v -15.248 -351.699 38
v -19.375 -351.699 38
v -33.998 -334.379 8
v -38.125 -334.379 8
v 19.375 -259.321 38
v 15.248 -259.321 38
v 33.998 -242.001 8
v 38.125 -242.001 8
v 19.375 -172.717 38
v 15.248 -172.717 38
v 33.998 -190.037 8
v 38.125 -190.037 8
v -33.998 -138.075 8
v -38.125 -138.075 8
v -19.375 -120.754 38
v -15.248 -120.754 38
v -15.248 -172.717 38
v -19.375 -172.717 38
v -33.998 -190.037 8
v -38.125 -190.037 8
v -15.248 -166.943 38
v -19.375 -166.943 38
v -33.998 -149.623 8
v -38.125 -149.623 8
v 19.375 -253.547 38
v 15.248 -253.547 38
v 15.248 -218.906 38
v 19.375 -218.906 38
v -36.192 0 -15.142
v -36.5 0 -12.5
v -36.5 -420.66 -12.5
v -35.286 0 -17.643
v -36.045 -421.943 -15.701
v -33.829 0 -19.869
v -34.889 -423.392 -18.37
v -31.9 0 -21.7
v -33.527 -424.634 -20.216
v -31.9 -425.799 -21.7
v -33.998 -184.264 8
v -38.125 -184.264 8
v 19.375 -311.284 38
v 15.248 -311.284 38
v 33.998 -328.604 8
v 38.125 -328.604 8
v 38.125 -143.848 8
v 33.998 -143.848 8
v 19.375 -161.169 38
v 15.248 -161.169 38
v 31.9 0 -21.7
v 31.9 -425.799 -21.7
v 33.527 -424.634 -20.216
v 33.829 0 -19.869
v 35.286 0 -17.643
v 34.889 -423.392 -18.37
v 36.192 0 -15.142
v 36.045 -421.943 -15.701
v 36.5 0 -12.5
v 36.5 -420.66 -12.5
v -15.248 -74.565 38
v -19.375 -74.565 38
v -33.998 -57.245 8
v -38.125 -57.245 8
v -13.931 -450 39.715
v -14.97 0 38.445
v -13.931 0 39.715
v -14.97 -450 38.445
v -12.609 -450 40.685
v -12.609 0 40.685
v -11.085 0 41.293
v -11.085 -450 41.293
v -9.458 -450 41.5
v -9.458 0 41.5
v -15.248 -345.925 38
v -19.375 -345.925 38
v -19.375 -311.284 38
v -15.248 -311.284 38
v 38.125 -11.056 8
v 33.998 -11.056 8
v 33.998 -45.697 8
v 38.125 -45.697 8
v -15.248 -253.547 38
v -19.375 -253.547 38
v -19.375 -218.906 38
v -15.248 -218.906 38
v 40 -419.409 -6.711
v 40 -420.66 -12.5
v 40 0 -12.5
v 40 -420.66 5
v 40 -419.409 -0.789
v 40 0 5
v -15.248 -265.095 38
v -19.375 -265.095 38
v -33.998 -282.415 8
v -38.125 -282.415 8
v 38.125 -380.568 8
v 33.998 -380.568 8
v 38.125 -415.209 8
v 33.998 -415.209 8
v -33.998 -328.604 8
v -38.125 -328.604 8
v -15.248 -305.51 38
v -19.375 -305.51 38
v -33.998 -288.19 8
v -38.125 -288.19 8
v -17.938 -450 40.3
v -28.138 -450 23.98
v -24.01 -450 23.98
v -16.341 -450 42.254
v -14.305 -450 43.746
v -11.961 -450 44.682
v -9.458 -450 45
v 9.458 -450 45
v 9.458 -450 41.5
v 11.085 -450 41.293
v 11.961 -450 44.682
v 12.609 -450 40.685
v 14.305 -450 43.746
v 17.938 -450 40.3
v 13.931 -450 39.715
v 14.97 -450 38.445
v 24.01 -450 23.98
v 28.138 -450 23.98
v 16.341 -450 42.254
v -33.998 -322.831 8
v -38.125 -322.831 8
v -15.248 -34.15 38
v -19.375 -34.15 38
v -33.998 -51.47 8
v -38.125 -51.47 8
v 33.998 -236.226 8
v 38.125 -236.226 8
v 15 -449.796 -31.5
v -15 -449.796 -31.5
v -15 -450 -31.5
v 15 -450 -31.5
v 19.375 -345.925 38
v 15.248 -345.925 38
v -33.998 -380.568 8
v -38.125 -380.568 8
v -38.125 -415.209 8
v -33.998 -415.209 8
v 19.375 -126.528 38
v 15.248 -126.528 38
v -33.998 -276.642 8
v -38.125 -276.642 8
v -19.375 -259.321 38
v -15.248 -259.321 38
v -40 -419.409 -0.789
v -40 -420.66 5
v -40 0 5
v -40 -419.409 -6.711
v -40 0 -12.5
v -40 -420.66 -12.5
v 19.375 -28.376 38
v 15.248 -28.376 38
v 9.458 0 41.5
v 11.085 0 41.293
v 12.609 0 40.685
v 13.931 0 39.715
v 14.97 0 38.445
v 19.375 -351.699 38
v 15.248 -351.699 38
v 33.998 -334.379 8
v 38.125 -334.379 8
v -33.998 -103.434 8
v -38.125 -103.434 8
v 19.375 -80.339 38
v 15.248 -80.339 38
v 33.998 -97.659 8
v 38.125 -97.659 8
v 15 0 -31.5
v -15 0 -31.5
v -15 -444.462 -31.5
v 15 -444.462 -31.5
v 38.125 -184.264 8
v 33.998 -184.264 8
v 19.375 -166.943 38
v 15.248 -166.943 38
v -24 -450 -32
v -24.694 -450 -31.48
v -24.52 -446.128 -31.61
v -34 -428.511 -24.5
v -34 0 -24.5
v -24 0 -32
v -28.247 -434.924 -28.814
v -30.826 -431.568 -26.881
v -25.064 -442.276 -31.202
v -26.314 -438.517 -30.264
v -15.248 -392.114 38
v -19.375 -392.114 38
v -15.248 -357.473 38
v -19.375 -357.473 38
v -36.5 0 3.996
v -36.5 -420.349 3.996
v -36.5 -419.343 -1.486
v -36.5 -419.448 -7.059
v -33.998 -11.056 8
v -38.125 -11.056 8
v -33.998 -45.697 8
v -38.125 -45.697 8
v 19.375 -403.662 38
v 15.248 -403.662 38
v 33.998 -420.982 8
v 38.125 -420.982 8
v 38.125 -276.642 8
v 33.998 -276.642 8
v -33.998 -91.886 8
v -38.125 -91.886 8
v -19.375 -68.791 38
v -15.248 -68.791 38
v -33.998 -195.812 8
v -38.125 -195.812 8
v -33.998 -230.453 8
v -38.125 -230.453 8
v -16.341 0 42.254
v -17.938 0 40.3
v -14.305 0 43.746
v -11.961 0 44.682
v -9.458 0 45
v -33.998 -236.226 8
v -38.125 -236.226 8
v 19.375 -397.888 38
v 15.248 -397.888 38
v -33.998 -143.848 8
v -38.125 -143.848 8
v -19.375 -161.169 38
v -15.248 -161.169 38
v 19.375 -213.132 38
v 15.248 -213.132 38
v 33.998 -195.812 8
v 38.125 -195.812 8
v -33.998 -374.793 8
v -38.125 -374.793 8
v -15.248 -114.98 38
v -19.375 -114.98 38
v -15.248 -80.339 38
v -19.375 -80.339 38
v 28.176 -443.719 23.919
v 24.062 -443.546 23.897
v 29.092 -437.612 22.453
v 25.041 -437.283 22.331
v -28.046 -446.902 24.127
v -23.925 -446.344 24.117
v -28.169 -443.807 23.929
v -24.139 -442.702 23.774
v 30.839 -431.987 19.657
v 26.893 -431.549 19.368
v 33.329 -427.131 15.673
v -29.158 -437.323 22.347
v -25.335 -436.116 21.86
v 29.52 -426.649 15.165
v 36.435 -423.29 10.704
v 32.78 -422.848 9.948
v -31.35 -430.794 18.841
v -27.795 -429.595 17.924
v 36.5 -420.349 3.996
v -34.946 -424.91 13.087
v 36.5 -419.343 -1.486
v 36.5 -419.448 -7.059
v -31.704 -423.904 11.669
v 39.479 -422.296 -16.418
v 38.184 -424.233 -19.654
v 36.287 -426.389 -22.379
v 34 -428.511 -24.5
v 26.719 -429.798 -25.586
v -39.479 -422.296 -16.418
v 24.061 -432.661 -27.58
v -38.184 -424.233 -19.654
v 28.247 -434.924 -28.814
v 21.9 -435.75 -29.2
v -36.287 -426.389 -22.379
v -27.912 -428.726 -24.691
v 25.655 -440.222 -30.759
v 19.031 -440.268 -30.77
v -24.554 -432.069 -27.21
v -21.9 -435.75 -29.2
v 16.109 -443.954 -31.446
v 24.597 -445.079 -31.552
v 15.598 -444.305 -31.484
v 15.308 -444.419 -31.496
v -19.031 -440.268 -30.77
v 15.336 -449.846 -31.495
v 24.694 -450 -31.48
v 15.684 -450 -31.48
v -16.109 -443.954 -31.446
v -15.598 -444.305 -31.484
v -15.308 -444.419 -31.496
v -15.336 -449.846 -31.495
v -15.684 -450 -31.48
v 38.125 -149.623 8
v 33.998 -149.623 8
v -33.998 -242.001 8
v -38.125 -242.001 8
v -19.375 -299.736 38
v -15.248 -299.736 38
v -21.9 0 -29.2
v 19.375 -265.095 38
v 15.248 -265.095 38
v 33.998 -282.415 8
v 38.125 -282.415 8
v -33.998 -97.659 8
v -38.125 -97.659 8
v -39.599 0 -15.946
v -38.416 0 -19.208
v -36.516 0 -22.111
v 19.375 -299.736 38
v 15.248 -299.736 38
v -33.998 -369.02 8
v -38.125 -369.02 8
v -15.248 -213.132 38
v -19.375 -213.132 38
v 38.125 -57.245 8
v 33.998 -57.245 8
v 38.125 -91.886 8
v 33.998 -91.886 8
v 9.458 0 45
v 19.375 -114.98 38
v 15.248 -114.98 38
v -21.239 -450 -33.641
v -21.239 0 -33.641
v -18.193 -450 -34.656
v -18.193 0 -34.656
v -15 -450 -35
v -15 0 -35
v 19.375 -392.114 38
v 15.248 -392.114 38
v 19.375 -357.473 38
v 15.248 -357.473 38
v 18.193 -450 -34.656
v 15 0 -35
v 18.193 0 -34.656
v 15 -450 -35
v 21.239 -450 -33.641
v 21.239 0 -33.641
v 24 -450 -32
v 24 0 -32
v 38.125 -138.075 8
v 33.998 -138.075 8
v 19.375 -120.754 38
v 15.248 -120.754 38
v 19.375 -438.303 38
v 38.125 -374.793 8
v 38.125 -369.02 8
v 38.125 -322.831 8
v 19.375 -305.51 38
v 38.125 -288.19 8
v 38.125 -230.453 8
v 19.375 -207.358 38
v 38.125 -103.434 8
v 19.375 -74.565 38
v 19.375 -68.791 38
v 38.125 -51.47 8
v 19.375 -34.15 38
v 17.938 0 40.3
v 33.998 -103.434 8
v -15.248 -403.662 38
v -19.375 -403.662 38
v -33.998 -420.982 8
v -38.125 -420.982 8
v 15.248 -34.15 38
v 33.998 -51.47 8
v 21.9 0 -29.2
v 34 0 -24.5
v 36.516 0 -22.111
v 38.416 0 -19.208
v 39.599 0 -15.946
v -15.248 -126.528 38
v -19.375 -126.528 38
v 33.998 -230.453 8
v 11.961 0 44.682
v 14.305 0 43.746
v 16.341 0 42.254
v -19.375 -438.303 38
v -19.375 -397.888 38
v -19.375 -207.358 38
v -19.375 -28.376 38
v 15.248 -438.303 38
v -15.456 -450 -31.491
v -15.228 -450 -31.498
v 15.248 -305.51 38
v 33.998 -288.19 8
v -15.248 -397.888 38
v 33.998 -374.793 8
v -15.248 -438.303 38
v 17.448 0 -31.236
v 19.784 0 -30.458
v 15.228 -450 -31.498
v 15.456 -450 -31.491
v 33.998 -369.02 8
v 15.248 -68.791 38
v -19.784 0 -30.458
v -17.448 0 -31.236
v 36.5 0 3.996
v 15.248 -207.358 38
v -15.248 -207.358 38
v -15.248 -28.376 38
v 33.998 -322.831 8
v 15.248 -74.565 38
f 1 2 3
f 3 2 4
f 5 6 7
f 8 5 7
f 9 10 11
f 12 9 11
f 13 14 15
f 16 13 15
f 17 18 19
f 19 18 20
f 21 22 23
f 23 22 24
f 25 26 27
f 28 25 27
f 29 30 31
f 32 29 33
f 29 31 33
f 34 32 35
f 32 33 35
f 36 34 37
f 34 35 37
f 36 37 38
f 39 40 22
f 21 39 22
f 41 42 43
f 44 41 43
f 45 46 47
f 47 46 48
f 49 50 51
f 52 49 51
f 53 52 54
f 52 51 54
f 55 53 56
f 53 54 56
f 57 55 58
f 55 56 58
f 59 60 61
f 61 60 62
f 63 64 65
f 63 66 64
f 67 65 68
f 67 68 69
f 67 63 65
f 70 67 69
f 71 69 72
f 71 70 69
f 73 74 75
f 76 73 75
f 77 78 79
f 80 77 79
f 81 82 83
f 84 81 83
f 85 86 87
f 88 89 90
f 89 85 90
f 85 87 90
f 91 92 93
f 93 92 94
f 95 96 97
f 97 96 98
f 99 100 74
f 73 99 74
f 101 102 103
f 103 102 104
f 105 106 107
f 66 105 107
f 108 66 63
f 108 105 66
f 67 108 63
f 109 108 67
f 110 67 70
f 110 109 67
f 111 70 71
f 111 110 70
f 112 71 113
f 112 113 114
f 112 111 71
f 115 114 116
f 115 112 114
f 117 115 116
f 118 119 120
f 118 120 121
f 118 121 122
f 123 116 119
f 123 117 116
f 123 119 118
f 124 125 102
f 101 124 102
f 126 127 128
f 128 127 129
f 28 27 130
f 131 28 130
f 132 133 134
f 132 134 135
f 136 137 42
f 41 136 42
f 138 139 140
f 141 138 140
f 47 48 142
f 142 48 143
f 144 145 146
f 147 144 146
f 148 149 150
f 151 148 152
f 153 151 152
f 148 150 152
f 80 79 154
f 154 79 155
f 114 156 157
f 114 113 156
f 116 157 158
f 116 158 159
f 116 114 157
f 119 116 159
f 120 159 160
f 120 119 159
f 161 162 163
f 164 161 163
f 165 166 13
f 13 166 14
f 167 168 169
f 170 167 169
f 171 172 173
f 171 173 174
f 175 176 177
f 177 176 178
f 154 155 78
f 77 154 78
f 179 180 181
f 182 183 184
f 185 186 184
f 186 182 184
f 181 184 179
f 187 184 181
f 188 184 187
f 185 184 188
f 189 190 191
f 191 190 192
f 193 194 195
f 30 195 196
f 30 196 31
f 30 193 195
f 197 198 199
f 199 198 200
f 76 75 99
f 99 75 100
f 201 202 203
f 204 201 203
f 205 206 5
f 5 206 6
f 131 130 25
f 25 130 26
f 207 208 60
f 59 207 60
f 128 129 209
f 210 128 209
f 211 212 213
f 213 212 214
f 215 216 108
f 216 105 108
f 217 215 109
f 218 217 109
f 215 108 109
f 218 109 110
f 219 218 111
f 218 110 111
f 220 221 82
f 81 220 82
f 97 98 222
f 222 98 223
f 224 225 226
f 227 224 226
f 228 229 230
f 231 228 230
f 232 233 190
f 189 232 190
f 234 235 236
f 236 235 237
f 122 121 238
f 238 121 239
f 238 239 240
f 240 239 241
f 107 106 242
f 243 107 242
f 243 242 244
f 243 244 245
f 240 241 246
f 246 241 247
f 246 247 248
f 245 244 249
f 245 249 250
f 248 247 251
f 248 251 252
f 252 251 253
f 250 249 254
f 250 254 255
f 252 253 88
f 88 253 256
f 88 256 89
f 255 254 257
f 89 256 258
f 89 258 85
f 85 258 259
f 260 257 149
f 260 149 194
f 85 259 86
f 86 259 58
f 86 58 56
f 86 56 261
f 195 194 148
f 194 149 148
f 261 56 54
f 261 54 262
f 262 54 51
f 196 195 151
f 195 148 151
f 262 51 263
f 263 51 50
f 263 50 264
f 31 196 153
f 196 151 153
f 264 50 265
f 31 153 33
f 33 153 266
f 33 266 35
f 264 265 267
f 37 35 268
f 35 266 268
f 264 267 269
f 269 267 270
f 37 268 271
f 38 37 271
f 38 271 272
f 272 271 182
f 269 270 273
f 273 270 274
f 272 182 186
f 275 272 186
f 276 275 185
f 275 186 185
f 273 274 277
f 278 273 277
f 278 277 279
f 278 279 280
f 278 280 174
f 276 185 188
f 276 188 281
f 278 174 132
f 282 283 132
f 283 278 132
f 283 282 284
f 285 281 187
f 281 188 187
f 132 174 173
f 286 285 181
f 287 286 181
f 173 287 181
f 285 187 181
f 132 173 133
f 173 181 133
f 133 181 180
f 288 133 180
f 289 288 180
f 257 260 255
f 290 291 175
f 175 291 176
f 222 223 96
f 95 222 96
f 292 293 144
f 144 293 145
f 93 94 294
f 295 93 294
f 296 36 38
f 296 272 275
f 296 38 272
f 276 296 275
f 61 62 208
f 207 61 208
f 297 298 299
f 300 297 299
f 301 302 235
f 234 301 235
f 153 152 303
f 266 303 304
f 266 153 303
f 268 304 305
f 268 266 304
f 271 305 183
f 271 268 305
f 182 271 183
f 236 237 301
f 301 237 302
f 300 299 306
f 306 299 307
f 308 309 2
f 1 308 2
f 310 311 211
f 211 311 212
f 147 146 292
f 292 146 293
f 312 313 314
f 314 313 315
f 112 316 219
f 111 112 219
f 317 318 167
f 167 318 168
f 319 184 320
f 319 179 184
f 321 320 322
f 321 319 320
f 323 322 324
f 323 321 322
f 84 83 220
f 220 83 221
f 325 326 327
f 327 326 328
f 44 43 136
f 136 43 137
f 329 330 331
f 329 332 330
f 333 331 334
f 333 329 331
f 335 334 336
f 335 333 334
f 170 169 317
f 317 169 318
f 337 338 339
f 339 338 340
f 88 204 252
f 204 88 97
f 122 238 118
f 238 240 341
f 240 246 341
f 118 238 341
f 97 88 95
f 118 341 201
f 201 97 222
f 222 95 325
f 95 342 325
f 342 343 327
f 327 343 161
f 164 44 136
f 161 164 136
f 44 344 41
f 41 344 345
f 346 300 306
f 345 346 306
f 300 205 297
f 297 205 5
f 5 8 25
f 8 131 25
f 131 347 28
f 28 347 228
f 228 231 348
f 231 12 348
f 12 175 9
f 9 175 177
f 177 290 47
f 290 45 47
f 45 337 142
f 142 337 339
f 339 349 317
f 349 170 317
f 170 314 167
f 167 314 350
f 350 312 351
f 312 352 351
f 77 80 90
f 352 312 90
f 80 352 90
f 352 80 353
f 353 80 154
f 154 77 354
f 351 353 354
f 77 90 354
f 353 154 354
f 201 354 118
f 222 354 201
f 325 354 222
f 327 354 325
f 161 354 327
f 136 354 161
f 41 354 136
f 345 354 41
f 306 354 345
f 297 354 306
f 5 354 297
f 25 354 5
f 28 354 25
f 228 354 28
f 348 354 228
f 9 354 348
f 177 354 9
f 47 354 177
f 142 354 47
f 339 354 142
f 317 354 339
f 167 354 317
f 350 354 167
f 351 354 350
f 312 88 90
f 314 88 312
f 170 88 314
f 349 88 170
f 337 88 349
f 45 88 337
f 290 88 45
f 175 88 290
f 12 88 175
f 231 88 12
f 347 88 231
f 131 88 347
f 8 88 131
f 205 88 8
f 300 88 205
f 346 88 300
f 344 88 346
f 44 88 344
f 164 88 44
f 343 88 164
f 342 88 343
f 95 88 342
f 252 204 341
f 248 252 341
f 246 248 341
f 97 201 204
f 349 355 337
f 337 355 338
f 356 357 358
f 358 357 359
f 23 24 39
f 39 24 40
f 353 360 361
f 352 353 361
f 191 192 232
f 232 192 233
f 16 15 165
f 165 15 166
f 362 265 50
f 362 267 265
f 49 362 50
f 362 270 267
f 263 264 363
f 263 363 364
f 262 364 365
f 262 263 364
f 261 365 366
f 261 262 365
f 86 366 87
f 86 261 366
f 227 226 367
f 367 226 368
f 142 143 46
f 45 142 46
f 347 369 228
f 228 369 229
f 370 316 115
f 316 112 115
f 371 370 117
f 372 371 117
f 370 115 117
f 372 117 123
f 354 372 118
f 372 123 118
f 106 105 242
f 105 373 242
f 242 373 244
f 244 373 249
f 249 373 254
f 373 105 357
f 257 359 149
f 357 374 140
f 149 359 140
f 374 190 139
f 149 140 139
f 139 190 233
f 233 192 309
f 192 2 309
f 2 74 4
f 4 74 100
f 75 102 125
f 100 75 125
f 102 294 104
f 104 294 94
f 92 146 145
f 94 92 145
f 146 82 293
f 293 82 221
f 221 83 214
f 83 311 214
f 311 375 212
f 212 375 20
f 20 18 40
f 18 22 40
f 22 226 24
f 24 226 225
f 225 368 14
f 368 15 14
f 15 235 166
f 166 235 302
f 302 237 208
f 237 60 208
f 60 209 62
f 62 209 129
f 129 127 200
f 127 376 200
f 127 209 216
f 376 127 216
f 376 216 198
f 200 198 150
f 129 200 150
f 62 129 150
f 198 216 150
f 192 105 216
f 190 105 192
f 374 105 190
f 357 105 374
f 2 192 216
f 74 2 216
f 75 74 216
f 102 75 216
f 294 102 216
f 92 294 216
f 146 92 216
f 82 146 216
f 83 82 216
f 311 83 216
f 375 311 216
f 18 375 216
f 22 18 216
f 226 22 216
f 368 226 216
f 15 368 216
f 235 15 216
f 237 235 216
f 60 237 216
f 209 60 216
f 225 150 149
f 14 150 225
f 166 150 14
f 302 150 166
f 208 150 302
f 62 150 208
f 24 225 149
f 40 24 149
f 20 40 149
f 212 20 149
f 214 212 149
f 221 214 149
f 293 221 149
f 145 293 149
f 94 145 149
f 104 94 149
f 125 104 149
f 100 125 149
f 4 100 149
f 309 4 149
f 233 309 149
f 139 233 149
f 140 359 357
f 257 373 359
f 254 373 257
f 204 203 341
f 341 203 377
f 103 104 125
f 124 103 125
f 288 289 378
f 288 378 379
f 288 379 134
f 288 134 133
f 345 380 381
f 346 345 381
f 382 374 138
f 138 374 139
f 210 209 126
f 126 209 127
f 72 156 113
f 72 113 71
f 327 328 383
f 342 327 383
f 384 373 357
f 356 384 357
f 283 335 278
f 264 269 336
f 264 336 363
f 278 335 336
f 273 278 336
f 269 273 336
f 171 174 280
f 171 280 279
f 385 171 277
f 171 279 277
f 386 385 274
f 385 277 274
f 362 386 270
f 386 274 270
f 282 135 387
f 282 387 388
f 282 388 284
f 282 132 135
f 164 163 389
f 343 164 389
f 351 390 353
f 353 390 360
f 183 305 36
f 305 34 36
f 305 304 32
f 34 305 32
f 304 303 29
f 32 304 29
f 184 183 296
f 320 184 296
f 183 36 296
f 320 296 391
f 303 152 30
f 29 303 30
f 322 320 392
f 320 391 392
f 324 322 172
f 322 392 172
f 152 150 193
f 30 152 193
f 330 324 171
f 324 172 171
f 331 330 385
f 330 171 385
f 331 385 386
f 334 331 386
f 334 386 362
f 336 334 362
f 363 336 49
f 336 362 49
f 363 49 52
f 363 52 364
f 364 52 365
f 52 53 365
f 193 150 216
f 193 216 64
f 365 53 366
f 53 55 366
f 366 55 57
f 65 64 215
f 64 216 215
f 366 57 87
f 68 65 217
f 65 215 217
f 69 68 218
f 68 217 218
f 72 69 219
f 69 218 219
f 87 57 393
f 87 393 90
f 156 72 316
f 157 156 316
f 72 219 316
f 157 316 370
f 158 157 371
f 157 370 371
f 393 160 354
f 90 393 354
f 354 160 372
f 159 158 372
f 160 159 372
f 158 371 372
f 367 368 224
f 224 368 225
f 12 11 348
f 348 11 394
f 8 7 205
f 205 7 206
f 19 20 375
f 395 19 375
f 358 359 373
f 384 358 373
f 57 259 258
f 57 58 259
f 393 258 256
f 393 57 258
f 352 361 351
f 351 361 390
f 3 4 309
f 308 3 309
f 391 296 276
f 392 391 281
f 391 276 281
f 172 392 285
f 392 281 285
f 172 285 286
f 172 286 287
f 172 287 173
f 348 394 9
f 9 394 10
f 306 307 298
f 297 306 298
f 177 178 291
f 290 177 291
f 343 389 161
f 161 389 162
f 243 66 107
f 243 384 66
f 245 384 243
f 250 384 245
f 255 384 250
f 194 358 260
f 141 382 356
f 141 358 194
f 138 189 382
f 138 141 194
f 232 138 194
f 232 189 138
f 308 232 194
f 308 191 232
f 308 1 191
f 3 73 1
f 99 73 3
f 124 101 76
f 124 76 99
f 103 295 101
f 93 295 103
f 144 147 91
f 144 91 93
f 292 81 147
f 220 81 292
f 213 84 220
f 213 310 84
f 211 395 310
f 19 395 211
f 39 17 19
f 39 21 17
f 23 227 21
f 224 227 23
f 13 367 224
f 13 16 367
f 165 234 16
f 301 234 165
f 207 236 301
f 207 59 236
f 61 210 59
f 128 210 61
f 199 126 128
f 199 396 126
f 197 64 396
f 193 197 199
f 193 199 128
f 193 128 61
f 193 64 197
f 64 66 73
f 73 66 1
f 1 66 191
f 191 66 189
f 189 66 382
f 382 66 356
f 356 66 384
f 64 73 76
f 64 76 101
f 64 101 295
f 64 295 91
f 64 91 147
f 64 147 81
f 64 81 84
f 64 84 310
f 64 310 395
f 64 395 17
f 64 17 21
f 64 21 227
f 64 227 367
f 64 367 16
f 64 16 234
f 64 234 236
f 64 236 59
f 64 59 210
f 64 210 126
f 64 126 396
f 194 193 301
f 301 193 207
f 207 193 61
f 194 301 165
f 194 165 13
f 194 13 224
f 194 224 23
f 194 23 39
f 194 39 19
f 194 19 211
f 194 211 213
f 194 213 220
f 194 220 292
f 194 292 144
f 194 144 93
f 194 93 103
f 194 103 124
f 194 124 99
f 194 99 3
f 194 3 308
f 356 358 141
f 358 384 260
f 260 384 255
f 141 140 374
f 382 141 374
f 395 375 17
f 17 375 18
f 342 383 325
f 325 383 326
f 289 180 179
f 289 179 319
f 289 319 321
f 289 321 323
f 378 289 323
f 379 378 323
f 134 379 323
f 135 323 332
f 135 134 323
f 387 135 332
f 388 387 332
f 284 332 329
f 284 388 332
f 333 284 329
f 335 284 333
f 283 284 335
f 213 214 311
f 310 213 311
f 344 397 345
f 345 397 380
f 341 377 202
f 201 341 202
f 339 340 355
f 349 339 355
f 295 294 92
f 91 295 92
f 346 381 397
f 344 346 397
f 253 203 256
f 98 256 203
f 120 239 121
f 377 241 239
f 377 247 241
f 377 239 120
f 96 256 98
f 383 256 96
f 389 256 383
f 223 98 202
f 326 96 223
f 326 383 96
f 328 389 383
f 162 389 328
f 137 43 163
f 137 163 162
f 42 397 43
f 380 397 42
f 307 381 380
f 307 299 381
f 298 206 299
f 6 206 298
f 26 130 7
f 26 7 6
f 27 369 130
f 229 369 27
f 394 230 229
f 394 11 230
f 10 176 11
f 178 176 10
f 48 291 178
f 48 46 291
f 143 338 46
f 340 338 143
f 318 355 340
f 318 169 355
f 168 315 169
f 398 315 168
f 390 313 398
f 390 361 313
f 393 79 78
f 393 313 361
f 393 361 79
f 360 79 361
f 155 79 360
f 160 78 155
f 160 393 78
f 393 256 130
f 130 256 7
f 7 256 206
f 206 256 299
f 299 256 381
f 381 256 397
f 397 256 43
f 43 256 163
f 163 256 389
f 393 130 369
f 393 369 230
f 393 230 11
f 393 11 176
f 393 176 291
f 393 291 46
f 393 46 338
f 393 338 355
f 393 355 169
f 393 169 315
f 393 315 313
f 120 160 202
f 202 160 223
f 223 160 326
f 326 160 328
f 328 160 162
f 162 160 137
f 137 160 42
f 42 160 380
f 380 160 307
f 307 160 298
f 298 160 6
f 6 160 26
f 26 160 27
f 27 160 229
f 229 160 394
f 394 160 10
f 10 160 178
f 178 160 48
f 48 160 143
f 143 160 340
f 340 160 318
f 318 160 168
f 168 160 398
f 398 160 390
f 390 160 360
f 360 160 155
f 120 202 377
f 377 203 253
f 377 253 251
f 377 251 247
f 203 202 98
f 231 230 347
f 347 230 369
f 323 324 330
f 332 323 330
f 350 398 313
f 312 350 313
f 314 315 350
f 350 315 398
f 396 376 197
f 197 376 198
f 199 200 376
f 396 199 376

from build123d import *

# Parameters (mm, degrees)
F1_DEPTH = 450
F2_R     = 15
F3_R     = 10
F4_T     = -3.5
F6_DEPTH = 85
F7_R     = 27.877855
F8_DEPTH = 85


with BuildPart() as f1:
    # F0 (on Front) → F1 (new body)
    with BuildSketch(Plane.XZ):
        Polygon((-15, 45), (-40, 5), (-40, -20), (-20, -35), (20, -35), (40, -20), (40, 5), (15, 45), align=None)
    extrude(amount=F1_DEPTH)

    # F2
    f2_edges = [f1.edges().sort_by_distance(p)[0] for p in [
        (-20, -225, -35),
        (-40, -225, -20),
        (20, -225, -35),
        (40, -225, -20),
    ]]
    fillet(f2_edges, radius=F2_R)

    # F3
    f3_edges = [f1.edges().sort_by_distance(p)[0] for p in [
        (15, -225, 45),
        (-15, -225, 45),
    ]]
    fillet(f3_edges, radius=F3_R)

    # F4
    f4_openings = [f1.faces().sort_by_distance(p)[0] for p in [
        (0, -450, 1.855604),
        (0, 0, 1.855604),
    ]]
    offset(amount=F4_T, openings=f4_openings)

    # F5 (on face) → F6 (cut)
    with BuildSketch(Plane(origin=(-40, 0, 0), x_dir=(0, -1, 0), z_dir=(-1, 0, 0))):
        Polygon((415.208789, 8), (397.888281, 38), (380.567773, 8), align=None)
        Polygon((438.3028, 38), (403.661784, 38), (420.982292, 8), align=None)
        Polygon((369.019789, 8), (351.699281, 38), (334.378773, 8), align=None)
        Polygon((322.830789, 8), (305.510281, 38), (288.189773, 8), align=None)
        Polygon((392.1138, 38), (357.472784, 38), (374.793292, 8), align=None)
        Polygon((11.055773, 8), (45.696789, 8), (28.376281, 38), align=None)
        Polygon((51.470292, 8), (68.7908, 38), (34.149784, 38), align=None)
        Polygon((114.9798, 38), (80.338784, 38), (97.659292, 8), align=None)
        Polygon((91.885789, 8), (74.565281, 38), (57.244773, 8), align=None)
        Polygon((161.1688, 38), (126.527784, 38), (143.848292, 8), align=None)
        Polygon((138.074789, 8), (120.754281, 38), (103.433773, 8), align=None)
        Polygon((207.3578, 38), (172.716784, 38), (190.037292, 8), align=None)
        Polygon((184.263789, 8), (166.943281, 38), (149.622773, 8), align=None)
        Polygon((253.5468, 38), (218.905784, 38), (236.226292, 8), align=None)
        Polygon((230.452789, 8), (213.132281, 38), (195.811773, 8), align=None)
        Polygon((299.7358, 38), (265.094784, 38), (282.415292, 8), align=None)
        Polygon((276.641789, 8), (259.321281, 38), (242.000773, 8), align=None)
        Polygon((345.9248, 38), (311.283784, 38), (328.604292, 8), align=None)
    extrude(amount=-F6_DEPTH, mode=Mode.SUBTRACT)

    # F7 (on face) → F8 (cut)
    with BuildSketch(Plane(origin=(-40, 0, 0), x_dir=(0, -1, 0), z_dir=(-1, 0, 0))):
        with Locations((447.128892, -3.75)):
            Circle(F7_R)
    extrude(amount=-F8_DEPTH, mode=Mode.SUBTRACT)


solid = f1.part
